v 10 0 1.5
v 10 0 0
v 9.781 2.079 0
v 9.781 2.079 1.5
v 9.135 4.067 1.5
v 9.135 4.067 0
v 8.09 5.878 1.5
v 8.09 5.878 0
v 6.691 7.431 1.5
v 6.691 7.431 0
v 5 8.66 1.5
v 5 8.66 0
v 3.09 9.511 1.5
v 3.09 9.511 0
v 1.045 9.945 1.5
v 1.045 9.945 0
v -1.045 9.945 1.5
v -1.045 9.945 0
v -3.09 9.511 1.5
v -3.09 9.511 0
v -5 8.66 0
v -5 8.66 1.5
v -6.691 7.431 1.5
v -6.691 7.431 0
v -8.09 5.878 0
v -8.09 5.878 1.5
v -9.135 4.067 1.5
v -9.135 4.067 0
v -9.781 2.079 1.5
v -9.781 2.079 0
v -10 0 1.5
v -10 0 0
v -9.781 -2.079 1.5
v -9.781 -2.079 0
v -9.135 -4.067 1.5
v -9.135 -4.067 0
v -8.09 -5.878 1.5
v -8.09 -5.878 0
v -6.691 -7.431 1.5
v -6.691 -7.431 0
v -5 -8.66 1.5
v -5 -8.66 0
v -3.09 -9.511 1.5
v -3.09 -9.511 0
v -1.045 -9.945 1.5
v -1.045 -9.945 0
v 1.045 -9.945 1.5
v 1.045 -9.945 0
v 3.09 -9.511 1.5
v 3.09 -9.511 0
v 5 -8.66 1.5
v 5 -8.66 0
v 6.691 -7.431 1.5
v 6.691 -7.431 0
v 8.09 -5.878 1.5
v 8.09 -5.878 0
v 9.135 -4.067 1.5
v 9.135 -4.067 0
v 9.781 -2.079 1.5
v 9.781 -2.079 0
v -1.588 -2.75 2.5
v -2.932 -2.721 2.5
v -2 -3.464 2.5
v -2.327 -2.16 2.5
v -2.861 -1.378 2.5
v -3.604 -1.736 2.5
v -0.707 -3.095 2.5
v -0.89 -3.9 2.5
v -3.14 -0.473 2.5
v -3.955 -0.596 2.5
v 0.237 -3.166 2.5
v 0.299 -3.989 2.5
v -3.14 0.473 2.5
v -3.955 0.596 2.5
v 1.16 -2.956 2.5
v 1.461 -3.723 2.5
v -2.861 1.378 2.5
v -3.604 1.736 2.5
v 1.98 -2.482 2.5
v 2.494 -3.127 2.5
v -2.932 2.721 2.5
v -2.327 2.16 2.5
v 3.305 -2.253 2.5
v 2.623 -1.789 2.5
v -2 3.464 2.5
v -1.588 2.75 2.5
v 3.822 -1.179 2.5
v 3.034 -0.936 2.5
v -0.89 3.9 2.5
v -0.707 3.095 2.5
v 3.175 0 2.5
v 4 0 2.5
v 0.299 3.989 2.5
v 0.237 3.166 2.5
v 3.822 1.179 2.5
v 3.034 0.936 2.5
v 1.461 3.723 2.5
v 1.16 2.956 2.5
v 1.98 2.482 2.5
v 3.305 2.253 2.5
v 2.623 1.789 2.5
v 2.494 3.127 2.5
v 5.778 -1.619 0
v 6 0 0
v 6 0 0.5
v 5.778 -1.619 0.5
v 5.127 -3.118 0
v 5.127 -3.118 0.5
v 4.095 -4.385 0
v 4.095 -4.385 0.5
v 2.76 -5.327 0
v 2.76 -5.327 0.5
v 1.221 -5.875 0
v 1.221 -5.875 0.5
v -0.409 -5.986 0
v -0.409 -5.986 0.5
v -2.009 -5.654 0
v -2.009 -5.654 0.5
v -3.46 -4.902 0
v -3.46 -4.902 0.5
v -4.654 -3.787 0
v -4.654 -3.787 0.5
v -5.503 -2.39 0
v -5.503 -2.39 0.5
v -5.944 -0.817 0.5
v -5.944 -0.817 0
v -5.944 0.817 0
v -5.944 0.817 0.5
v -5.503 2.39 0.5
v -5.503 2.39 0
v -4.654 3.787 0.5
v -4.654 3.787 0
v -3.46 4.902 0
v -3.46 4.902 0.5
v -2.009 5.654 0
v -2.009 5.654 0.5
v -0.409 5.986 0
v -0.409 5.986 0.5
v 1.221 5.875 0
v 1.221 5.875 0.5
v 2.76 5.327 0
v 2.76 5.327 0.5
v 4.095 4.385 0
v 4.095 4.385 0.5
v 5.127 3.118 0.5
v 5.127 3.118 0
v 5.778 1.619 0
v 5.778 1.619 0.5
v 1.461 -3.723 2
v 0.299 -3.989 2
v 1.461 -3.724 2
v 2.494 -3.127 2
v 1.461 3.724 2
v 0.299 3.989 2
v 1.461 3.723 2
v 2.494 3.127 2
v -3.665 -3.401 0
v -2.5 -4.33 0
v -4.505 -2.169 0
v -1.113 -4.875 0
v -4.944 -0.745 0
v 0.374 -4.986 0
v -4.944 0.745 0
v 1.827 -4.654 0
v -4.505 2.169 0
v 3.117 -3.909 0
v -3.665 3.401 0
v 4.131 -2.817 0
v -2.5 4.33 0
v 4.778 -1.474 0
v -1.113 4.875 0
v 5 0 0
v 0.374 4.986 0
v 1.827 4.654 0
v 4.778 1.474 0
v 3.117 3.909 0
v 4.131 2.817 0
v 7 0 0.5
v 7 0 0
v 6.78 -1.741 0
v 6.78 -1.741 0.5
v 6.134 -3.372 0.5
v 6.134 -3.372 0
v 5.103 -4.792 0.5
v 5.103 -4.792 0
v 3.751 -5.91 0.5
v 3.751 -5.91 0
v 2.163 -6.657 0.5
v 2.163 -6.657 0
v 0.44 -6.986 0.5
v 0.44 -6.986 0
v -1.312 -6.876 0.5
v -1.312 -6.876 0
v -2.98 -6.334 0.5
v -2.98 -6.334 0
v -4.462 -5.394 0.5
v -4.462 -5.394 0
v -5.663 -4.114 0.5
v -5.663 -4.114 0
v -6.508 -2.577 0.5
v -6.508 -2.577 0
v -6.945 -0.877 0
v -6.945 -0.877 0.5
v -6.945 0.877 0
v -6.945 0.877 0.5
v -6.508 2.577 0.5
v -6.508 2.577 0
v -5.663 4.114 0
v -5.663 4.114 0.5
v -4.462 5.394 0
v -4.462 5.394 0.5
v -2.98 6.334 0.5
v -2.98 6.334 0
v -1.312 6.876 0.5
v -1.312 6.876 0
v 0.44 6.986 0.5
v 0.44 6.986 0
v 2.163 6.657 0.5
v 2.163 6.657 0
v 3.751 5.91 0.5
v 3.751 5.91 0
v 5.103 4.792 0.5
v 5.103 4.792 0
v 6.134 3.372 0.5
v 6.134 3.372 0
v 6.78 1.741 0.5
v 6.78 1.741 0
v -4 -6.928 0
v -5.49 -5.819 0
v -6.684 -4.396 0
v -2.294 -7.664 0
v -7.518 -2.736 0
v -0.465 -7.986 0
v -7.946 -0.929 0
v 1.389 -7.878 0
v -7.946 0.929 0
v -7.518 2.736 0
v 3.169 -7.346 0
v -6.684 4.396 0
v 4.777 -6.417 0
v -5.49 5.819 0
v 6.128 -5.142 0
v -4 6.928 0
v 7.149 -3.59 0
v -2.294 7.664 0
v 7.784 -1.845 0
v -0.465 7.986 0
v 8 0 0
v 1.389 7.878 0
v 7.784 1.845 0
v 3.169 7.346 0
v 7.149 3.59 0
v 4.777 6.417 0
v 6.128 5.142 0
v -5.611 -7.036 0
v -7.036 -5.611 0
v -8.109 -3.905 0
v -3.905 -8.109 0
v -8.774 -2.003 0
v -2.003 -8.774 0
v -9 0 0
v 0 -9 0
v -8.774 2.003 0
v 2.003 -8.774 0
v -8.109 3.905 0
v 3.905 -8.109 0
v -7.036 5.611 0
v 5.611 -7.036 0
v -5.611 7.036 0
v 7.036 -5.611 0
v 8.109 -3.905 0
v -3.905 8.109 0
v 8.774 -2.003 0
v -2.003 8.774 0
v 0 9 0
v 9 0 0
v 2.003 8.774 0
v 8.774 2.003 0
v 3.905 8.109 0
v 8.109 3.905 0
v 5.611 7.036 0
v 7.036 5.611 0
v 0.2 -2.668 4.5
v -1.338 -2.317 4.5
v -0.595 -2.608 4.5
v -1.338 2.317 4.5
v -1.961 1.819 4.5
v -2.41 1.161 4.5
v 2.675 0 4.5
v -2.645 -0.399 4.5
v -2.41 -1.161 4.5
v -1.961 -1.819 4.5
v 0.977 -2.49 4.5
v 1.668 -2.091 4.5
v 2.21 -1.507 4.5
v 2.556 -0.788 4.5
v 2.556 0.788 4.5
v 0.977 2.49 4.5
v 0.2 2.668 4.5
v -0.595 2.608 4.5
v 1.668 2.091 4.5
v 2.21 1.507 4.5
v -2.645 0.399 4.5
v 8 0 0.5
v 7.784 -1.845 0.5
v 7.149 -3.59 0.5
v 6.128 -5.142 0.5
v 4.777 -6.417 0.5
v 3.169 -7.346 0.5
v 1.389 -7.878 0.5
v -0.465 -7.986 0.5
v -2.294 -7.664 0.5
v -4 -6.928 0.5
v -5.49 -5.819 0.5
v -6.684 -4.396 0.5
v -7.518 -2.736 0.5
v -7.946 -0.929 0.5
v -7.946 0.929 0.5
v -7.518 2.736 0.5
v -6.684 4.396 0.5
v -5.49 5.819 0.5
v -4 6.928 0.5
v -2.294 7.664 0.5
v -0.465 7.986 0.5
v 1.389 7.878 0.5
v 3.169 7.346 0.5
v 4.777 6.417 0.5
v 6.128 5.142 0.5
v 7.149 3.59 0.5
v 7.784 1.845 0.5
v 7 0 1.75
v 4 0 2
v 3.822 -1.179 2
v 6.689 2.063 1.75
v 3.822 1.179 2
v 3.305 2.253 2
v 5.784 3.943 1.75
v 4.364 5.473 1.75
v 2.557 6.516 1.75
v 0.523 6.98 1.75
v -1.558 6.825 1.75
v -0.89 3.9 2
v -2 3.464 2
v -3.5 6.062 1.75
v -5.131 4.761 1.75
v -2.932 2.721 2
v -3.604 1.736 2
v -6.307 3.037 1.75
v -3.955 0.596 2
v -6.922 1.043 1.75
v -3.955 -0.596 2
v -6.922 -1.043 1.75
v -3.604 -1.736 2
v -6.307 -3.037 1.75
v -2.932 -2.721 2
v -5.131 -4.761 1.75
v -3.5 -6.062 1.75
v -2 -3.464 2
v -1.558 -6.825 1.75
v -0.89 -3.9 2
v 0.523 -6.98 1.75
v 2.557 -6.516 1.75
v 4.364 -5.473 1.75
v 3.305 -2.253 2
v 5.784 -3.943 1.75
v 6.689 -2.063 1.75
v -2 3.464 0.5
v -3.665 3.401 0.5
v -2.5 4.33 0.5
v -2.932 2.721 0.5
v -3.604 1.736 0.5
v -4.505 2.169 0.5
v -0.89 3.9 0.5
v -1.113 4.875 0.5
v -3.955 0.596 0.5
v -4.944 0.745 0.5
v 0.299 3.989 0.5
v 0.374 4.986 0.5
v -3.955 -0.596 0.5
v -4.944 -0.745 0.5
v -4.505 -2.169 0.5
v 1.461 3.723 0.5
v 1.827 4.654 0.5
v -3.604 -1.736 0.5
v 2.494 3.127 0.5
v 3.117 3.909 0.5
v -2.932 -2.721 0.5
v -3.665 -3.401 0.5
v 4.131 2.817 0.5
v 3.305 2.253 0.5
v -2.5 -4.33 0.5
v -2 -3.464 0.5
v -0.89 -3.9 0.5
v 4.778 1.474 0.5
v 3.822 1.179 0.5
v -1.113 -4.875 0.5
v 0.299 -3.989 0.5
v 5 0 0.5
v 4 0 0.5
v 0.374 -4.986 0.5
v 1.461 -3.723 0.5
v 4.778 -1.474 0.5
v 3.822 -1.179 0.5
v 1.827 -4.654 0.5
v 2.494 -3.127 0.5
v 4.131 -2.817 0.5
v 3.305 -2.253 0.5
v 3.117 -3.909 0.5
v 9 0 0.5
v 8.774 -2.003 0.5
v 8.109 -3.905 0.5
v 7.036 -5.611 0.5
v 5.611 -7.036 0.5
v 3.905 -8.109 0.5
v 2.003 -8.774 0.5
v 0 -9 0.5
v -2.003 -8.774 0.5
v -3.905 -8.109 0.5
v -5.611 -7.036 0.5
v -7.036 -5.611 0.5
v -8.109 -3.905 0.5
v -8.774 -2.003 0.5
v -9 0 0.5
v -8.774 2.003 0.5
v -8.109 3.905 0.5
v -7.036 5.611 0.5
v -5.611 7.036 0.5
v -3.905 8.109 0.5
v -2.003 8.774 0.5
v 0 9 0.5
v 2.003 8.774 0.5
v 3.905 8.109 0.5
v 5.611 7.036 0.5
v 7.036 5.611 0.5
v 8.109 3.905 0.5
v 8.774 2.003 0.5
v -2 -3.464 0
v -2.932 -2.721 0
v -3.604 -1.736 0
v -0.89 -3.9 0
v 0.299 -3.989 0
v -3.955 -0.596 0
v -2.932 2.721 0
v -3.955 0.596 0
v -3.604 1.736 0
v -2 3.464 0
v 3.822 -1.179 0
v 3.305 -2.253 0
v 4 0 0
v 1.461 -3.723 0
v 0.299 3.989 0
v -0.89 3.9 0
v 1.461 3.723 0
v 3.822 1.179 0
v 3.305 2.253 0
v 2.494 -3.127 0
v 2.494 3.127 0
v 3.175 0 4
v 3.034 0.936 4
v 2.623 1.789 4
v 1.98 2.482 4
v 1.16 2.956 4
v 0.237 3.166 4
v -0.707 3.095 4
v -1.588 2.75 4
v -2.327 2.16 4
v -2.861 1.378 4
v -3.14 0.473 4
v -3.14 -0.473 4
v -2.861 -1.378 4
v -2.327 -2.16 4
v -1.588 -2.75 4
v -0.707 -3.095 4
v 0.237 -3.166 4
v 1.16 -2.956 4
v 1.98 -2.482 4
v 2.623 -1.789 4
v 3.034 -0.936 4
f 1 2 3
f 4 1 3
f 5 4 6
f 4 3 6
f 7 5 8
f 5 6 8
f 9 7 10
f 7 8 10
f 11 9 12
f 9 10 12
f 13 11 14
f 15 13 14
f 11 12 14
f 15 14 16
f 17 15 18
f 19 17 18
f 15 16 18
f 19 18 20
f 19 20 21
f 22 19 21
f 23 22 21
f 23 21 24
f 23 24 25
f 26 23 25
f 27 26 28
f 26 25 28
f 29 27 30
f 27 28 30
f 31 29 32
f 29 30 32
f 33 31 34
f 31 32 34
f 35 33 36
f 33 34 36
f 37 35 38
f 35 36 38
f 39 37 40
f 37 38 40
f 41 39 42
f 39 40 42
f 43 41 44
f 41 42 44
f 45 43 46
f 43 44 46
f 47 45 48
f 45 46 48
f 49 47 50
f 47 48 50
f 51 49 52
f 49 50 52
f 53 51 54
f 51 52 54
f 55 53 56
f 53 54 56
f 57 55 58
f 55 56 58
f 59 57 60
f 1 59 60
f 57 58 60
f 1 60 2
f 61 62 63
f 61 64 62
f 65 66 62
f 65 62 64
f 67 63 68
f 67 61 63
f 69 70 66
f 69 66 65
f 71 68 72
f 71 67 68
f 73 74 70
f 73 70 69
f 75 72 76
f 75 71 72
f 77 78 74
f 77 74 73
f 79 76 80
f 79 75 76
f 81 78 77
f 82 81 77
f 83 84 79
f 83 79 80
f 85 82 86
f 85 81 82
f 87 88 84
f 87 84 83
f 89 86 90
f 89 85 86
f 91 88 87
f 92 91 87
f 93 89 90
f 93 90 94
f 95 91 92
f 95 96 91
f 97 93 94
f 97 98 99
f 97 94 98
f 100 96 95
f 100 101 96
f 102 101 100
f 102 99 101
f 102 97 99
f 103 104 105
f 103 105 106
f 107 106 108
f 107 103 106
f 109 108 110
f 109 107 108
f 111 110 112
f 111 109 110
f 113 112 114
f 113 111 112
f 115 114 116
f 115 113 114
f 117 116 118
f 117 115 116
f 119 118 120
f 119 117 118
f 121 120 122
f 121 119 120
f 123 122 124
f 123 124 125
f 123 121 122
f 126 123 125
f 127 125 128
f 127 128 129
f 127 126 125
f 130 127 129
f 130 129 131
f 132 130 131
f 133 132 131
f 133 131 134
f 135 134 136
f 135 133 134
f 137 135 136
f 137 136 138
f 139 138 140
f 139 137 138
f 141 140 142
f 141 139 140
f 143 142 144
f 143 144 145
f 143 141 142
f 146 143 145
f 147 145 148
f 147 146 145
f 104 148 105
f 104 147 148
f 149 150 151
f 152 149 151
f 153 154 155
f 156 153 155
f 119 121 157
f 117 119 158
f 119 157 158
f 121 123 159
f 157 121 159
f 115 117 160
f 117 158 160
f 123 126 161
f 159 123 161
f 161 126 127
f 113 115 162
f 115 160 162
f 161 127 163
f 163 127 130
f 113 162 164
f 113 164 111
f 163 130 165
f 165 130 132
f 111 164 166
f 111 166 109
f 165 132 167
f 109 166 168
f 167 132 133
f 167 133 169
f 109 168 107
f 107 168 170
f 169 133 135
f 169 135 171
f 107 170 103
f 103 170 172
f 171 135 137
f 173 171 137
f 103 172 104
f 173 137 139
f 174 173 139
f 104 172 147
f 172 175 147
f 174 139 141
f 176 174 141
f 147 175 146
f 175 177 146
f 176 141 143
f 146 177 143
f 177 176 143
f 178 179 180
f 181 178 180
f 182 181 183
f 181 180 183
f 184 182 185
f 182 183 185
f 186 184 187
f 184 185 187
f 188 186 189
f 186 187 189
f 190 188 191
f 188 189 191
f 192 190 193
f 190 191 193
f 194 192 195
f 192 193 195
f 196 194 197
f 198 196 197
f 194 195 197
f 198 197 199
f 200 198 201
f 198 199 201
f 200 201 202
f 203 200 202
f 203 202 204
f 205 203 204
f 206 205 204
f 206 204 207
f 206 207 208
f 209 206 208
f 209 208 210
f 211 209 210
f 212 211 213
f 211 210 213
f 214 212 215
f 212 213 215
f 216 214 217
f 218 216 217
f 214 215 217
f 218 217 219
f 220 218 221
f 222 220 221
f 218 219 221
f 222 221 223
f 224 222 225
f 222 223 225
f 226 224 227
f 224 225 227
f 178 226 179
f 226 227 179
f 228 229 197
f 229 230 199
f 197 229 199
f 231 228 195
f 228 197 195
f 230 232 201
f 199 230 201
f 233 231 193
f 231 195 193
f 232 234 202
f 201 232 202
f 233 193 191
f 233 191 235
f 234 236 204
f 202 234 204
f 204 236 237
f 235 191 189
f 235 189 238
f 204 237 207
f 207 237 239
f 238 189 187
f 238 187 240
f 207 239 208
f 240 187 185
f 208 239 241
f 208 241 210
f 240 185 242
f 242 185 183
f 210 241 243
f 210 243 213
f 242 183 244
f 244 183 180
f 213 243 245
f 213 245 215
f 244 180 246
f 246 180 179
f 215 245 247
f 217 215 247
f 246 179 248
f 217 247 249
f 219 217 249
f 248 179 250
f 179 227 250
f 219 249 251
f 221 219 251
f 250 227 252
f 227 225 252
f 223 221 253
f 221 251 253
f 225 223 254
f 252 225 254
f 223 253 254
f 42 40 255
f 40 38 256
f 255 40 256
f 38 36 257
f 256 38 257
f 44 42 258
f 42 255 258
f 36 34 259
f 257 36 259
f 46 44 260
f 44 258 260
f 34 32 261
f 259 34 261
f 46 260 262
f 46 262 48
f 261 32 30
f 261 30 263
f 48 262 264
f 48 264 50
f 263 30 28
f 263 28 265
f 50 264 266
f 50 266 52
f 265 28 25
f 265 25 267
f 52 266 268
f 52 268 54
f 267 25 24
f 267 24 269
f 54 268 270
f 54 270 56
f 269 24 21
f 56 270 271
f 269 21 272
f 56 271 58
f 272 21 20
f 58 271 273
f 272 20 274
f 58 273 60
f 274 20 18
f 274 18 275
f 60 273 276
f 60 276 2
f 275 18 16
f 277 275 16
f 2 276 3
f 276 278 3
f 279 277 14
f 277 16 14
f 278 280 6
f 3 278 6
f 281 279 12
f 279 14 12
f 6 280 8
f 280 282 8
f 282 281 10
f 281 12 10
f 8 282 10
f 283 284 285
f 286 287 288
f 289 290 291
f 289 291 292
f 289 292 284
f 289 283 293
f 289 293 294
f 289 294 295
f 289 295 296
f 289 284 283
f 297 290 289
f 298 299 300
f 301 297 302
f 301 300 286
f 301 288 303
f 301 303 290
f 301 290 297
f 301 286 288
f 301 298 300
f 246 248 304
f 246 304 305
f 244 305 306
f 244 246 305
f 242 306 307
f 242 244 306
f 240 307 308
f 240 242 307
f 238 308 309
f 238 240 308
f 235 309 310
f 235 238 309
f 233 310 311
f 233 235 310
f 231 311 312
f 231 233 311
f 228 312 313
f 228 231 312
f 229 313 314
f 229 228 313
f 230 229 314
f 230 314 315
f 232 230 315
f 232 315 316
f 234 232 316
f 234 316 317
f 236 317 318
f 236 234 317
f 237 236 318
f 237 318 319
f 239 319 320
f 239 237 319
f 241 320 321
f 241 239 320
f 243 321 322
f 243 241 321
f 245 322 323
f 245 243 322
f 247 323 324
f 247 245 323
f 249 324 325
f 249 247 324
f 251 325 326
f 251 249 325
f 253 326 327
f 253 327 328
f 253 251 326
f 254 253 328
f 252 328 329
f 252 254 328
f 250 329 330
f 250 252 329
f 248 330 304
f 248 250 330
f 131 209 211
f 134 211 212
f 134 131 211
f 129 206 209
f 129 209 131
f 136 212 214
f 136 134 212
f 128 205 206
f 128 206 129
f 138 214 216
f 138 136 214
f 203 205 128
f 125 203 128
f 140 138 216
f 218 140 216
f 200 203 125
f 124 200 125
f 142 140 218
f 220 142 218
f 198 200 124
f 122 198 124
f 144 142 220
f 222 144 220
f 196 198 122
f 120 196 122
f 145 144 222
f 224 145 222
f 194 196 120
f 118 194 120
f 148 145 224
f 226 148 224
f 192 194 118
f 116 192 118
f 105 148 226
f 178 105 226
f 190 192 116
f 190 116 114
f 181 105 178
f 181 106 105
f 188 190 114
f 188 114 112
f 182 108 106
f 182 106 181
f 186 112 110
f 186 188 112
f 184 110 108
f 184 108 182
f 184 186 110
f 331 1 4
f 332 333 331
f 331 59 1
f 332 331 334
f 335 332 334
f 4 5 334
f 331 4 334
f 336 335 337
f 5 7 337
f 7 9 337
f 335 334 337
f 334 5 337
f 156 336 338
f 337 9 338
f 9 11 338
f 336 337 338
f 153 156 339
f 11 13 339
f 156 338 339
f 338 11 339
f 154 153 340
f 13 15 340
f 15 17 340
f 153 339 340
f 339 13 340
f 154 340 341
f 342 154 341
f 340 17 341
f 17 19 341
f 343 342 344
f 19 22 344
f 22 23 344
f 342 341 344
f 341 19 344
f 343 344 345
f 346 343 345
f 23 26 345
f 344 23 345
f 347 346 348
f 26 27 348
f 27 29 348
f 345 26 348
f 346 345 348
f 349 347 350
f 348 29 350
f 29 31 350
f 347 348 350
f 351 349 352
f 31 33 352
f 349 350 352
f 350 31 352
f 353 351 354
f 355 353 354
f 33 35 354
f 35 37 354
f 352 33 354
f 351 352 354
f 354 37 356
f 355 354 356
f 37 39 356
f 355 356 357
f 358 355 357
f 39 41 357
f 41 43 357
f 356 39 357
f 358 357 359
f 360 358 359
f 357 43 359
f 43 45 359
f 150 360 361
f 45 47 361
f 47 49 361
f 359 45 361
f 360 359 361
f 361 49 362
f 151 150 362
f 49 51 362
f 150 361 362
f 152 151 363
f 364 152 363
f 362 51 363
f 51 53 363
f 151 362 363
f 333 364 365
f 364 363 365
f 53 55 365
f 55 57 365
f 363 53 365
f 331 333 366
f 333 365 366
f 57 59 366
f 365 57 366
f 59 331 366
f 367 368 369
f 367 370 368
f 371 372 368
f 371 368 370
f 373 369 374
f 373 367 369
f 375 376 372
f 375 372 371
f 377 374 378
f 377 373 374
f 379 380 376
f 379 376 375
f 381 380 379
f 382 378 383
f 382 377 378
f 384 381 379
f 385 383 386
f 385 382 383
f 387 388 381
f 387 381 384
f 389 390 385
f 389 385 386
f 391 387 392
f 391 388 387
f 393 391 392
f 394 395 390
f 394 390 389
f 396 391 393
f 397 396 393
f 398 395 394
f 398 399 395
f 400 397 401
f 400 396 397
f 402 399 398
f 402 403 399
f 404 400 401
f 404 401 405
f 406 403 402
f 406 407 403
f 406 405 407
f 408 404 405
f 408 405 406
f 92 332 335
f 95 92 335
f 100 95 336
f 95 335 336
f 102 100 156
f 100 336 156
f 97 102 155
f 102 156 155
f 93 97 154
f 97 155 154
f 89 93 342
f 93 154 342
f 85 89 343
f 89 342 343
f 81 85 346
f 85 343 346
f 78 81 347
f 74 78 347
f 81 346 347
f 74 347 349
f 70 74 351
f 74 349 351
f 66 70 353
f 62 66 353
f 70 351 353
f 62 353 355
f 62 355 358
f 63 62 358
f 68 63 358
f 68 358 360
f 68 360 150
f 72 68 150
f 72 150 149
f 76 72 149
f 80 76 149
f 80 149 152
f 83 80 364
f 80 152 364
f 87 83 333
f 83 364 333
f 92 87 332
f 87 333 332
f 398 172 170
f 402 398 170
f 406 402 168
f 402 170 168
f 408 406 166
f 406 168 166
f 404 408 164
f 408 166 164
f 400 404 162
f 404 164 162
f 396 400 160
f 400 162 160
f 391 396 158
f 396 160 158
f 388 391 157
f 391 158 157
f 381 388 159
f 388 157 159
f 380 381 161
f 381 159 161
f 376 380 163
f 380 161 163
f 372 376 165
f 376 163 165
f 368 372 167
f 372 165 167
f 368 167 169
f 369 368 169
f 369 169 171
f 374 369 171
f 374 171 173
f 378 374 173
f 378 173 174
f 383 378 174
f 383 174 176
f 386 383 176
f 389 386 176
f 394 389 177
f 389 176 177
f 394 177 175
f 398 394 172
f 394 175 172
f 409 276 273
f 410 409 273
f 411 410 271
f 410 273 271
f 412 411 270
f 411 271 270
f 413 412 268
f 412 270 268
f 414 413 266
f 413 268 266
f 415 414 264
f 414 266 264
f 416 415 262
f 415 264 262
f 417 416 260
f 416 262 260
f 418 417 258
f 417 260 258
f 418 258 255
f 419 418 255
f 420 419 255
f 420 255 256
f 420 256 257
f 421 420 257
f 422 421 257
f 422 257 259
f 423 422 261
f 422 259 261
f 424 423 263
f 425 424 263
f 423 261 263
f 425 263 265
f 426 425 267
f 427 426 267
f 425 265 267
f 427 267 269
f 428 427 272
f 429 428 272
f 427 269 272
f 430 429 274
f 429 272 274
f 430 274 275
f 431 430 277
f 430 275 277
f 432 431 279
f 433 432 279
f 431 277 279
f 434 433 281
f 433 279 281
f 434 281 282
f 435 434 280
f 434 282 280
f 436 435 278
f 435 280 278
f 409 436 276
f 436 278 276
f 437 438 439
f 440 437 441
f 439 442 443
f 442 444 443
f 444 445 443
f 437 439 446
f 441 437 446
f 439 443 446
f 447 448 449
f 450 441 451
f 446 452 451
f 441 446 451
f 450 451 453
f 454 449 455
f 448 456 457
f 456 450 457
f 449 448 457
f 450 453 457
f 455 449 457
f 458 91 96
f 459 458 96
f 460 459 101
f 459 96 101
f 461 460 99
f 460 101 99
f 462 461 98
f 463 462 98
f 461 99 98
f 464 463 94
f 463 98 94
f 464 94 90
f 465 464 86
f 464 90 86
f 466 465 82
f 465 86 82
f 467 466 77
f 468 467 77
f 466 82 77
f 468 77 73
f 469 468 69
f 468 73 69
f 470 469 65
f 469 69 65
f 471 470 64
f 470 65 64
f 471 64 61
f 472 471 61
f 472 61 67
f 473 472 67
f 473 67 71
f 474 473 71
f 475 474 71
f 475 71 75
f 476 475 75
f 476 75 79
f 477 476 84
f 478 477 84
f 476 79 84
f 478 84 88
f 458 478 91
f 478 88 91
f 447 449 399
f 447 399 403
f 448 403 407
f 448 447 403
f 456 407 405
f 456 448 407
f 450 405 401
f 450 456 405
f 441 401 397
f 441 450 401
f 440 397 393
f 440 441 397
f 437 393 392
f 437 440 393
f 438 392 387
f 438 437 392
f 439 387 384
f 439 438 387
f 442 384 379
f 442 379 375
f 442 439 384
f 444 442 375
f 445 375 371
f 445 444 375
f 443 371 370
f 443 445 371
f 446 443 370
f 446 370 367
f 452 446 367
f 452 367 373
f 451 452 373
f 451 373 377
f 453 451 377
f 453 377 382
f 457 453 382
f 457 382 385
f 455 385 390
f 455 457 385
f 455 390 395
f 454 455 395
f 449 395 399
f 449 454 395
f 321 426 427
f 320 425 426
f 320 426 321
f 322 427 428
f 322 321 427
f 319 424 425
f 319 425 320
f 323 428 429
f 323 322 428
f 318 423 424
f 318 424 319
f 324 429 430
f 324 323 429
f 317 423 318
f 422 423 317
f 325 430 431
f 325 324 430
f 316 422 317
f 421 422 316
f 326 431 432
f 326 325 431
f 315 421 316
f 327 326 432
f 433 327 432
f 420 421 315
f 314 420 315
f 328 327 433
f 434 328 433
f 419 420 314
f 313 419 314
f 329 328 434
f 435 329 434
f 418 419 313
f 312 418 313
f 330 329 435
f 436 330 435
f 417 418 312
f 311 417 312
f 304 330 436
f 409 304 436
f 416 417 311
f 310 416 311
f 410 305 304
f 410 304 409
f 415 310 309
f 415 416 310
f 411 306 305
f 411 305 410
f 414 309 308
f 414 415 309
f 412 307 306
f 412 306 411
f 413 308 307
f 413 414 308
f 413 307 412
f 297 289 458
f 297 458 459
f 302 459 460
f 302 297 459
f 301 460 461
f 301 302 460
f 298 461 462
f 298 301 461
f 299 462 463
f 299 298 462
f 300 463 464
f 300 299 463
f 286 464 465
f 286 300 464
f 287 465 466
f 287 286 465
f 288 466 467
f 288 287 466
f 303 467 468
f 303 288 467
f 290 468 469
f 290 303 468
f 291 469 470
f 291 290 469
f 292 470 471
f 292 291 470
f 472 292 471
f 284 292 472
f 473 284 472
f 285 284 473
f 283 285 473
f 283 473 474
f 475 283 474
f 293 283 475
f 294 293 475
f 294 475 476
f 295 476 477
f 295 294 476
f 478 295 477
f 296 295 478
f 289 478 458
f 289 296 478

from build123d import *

# Parameters (mm, degrees)
F0_R     = 10
F1_DEPTH = 2
F2_R     = 4
F3_DEPTH = 0.5
F4_R     = 3.175
F5_DEPTH = 2
F6_R     = 9
F6_R_2   = 8
F6_R_3   = 7
F6_R_4   = 6
F6_R_5   = 5
F6_R_6   = 4
F7_DEPTH = 0.5
F8_SIZE2 = 0.49999
F8_SIZE  = 5.99999
F9_SIZE  = 0.5


# Not quite as in the source:
# - a fillet or chamfer is up to 0.001 mm smaller than in the source, because OpenCascade refuses the exact size


with BuildPart() as f1:
    # F0 (on Top) → F1 (new body)
    with BuildSketch(Plane.XY):
        Circle(F0_R)
    extrude(amount=F1_DEPTH)

    # F2 (on face) → F3 (join)
    with BuildSketch(Plane.XY.offset(2)):
        Circle(F2_R)
    extrude(amount=F3_DEPTH)

    # F4 (on face) → F5 (join)
    with BuildSketch(Plane.XY.offset(2.5)):
        Circle(F4_R)
    extrude(amount=F5_DEPTH)

    # F6 (on face) → F7 (cut)
    with BuildSketch(Plane(origin=(0, 0, 0), x_dir=(1, 0, 0), z_dir=(0, 0, -1))):
        Circle(F6_R)
        Circle(F6_R_2, mode=Mode.SUBTRACT)
        Circle(F6_R_3)
        Circle(F6_R_4, mode=Mode.SUBTRACT)
        Circle(F6_R_5)
        Circle(F6_R_6, mode=Mode.SUBTRACT)
    extrude(amount=-F7_DEPTH, mode=Mode.SUBTRACT)

    # F8 (size 6 and 0.5 in the source; OpenCascade refuses exactly that, so slightly less here)
    f8_edges = [f1.edges().sort_by_distance(p)[0] for p in [
        (-10, 0, 2),
    ]]
    f8_side = f1.faces().sort_by_distance((-9.717157, 0, 2))[0]
    chamfer(f8_edges, length=F8_SIZE, length2=F8_SIZE2, reference=f8_side)

    # F9
    f9_edges = [f1.edges().sort_by_distance(p)[0] for p in [
        (-3.175, 0, 4.5),
    ]]
    chamfer(f9_edges, length=F9_SIZE)


solid = f1.part
